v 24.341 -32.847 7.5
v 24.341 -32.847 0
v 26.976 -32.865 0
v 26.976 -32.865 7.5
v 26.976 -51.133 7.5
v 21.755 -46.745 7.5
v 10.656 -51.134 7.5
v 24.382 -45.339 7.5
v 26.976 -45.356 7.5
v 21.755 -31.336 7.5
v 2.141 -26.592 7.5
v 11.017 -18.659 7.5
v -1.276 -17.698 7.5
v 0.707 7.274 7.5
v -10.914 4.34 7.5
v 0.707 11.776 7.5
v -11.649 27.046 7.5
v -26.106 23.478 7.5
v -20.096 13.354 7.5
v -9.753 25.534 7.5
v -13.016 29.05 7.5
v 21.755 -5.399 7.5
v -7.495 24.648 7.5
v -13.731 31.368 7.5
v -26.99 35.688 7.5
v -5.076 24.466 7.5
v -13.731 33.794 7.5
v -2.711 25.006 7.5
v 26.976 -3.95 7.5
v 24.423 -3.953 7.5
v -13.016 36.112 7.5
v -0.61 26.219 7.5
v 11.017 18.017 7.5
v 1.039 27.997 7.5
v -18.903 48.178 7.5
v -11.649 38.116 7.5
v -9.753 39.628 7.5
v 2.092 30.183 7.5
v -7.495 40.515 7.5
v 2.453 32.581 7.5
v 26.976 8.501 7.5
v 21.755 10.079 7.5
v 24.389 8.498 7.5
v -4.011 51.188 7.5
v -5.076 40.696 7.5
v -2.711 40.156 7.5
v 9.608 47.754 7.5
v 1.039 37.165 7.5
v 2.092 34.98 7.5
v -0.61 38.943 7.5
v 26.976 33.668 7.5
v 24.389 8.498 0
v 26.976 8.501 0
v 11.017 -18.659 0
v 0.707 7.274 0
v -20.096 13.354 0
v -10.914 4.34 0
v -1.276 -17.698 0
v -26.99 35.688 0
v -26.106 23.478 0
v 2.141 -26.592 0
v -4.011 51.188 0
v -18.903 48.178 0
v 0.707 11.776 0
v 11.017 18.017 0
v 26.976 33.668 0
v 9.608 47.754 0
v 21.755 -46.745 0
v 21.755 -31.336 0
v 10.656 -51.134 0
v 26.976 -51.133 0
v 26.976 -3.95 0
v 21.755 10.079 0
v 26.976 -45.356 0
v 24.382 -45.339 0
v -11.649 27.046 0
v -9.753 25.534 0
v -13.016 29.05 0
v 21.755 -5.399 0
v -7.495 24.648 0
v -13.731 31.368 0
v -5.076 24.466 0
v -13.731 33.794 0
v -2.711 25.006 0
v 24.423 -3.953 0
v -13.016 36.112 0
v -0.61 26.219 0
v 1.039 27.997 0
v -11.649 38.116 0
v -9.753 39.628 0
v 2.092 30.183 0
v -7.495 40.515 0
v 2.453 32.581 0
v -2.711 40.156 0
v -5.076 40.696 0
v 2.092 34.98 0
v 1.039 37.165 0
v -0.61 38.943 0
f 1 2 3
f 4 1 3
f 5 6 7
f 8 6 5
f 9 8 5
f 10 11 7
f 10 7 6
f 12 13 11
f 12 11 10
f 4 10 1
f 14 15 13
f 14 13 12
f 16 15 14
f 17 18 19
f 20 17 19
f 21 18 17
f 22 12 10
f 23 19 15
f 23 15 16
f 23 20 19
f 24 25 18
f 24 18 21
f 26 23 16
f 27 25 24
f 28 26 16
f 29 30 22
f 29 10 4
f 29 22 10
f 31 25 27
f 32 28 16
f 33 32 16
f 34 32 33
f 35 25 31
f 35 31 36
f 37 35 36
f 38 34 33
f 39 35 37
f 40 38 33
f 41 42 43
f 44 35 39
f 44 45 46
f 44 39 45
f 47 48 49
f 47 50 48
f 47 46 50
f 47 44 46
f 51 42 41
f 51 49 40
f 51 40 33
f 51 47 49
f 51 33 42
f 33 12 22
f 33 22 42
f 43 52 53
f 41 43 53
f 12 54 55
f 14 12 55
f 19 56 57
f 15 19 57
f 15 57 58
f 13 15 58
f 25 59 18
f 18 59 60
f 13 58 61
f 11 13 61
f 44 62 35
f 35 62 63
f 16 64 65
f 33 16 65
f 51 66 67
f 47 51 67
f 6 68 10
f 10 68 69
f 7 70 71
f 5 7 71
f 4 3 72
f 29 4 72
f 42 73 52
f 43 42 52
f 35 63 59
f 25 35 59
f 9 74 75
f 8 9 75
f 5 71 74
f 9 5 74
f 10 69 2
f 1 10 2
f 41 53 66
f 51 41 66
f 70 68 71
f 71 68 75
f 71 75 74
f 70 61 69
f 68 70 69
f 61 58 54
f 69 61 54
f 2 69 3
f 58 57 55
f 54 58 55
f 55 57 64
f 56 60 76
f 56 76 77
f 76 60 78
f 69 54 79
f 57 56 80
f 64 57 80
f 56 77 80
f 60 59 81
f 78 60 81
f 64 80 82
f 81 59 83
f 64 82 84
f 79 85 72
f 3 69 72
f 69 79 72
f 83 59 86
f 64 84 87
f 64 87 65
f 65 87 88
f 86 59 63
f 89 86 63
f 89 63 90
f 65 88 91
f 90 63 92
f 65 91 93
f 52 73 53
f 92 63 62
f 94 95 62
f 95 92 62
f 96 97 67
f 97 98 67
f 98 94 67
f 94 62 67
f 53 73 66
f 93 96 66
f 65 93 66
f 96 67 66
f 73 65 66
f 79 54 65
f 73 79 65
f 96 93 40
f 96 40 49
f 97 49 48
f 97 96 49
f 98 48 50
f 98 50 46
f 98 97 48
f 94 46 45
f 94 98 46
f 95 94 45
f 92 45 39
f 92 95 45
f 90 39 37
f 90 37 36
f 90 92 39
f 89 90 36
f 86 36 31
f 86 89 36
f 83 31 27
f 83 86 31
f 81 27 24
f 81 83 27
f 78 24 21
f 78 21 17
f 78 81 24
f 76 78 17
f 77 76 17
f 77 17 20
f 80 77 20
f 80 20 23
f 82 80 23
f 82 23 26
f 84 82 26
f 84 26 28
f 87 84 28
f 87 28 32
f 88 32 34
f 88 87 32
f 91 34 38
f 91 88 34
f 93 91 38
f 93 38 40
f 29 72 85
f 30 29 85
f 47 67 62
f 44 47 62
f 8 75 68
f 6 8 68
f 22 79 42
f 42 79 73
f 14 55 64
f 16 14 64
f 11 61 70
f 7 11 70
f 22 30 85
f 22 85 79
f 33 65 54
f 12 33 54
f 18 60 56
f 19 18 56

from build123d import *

# Parameters (mm, degrees)
SKETCH_1_R      = 8.137429072
EXTRUDE_1_DEPTH = 7.5


with BuildPart() as part:
    # 草图1 → 凸台-拉伸1 (new body)
    with BuildSketch(Plane.XY):
        Polygon((10.655742112, -51.13350276), (26.975655976, -51.132648268), (26.975655976, -45.355975578), (24.381633836, -45.338595321), (21.754811222, -46.744598553), (21.754811222, -31.335745249), (24.341110056, -32.847488843), (26.975655976, -32.865266967), (26.975655976, -3.94984418), (24.423395969, -3.952666276), (21.754811222, -5.399476315), (21.754811222, 10.078826219), (24.3888497, 8.498393016), (26.975655976, 8.501001852), (26.975655976, 14.3375467), (26.975655976, 33.668056688), (9.607760849, 47.75359746), (-4.011253891, 51.18832036), (-18.902979431, 48.177822313), (-26.990082321, 35.687740526), (-26.106294212, 23.478023729), (-20.096405563, 13.353512011), (-10.914003906, 4.339931688), (-1.275932846, -17.697925367), (2.140880051, -26.591846266), align=None)
        with Locations((-5.684087388, 32.581137097)):
            Circle(SKETCH_1_R, mode=Mode.SUBTRACT)
        Polygon((0.706809044, 7.273735046), (0.706809044, 11.775535583), (11.016924858, 18.016654968), (11.016924858, -18.659224532), align=None, mode=Mode.SUBTRACT)
    extrude(amount=EXTRUDE_1_DEPTH)


solid = part.part
